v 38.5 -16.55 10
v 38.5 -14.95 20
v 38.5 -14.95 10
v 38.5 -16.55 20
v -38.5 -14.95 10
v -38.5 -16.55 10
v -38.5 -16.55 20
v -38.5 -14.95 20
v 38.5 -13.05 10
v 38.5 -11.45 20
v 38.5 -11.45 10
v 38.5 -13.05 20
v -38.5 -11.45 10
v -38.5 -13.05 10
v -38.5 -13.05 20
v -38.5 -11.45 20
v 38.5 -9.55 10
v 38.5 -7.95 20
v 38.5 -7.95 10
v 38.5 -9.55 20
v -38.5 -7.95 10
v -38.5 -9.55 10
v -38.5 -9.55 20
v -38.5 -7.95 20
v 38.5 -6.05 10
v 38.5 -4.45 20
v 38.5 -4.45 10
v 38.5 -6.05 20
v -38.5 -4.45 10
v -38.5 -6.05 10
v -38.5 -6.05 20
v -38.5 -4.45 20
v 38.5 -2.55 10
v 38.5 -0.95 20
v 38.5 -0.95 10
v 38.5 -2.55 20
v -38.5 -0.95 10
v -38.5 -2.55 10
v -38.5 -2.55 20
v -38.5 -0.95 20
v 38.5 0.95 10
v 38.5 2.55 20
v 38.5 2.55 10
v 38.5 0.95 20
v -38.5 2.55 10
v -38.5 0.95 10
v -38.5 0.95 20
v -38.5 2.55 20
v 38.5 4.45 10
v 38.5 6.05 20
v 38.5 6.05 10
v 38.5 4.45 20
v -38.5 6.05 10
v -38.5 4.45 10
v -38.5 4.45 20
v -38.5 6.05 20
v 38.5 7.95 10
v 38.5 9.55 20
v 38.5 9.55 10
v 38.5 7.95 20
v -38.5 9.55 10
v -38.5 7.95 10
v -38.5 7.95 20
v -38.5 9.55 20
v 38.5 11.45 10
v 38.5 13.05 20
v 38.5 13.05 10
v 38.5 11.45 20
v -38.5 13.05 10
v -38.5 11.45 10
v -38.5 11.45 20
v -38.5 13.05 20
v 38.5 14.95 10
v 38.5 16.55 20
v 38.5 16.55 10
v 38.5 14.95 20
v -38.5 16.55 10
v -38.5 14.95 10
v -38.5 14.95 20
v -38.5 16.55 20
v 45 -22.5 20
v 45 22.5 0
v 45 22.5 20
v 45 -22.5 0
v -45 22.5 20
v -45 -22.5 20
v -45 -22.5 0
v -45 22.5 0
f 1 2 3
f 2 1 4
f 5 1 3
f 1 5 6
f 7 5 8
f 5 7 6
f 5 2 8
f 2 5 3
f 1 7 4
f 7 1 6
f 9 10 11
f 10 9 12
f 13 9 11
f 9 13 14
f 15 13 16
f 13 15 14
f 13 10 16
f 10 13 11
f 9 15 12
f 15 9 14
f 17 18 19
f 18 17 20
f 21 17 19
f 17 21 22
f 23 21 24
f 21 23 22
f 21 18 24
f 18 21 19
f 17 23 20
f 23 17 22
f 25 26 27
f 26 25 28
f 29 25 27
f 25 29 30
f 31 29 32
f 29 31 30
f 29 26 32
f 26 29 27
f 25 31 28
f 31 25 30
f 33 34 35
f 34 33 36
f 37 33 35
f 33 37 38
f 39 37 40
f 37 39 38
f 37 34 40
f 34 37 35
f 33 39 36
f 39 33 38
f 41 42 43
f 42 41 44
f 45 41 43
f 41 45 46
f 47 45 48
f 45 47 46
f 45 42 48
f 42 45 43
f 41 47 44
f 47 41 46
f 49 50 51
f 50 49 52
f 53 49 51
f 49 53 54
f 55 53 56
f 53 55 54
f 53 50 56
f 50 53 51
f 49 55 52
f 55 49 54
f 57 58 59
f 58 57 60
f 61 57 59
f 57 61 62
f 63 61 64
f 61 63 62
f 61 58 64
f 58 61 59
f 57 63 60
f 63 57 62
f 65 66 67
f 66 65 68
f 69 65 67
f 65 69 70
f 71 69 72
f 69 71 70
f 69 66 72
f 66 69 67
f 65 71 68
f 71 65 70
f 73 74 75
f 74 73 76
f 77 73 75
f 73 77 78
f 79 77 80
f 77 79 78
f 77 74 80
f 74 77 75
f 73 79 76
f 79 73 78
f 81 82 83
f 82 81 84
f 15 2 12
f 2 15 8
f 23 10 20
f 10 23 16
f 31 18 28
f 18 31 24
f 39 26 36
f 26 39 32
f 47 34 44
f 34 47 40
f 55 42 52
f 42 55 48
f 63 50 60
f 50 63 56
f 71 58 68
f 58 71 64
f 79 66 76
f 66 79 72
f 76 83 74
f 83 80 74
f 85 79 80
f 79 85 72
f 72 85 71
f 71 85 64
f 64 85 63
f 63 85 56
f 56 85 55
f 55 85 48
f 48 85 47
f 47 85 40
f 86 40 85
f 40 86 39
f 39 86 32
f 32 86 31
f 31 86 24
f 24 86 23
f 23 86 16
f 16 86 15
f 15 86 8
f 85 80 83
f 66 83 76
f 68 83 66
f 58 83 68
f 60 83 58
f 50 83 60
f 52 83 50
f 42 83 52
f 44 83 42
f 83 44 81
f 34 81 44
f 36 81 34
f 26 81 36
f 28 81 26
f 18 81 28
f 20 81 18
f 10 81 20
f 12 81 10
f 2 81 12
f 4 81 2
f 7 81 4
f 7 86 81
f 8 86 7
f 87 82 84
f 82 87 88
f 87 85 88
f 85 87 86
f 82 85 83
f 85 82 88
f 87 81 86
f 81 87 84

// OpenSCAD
// Slide drying rack - holds 10 microscope slides upright on their long edge
// Print orientation: base block on the XY plane, slots open upward (+Z)

// ---------------- Parameters ----------------
block_len    = 90;    // base block length along X (mm)
block_wid    = 45;    // base block width along Y (mm)
block_ht     = 20;    // base block height along Z (mm)

slot_len     = 77;    // slot length along X (mm)
slot_w       = 1.6;   // slot width along Y (mm)
slot_depth   = 10;    // slot depth from top face (mm)
slot_pitch   = 3.5;   // centre-to-centre slot spacing along Y (mm)
slot_count   = 10;    // number of slots

eps          = 0.5;   // overcut past faces to avoid coplanar surfaces (mm)

$fn = 64;

// ---------------- Model ----------------
difference() {
    // Solid base block, centred in X and Y, resting on z = 0
    translate([-block_len/2, -block_wid/2, 0])
        cube([block_len, block_wid, block_ht]);

    // Row of parallel slots, centred on the block in X and Y
    for (i = [0 : slot_count - 1]) {
        y_c = (i - (slot_count - 1)/2) * slot_pitch;
        translate([-slot_len/2, y_c - slot_w/2, block_ht - slot_depth])
            cube([slot_len, slot_w, slot_depth + eps]);
    }
}
